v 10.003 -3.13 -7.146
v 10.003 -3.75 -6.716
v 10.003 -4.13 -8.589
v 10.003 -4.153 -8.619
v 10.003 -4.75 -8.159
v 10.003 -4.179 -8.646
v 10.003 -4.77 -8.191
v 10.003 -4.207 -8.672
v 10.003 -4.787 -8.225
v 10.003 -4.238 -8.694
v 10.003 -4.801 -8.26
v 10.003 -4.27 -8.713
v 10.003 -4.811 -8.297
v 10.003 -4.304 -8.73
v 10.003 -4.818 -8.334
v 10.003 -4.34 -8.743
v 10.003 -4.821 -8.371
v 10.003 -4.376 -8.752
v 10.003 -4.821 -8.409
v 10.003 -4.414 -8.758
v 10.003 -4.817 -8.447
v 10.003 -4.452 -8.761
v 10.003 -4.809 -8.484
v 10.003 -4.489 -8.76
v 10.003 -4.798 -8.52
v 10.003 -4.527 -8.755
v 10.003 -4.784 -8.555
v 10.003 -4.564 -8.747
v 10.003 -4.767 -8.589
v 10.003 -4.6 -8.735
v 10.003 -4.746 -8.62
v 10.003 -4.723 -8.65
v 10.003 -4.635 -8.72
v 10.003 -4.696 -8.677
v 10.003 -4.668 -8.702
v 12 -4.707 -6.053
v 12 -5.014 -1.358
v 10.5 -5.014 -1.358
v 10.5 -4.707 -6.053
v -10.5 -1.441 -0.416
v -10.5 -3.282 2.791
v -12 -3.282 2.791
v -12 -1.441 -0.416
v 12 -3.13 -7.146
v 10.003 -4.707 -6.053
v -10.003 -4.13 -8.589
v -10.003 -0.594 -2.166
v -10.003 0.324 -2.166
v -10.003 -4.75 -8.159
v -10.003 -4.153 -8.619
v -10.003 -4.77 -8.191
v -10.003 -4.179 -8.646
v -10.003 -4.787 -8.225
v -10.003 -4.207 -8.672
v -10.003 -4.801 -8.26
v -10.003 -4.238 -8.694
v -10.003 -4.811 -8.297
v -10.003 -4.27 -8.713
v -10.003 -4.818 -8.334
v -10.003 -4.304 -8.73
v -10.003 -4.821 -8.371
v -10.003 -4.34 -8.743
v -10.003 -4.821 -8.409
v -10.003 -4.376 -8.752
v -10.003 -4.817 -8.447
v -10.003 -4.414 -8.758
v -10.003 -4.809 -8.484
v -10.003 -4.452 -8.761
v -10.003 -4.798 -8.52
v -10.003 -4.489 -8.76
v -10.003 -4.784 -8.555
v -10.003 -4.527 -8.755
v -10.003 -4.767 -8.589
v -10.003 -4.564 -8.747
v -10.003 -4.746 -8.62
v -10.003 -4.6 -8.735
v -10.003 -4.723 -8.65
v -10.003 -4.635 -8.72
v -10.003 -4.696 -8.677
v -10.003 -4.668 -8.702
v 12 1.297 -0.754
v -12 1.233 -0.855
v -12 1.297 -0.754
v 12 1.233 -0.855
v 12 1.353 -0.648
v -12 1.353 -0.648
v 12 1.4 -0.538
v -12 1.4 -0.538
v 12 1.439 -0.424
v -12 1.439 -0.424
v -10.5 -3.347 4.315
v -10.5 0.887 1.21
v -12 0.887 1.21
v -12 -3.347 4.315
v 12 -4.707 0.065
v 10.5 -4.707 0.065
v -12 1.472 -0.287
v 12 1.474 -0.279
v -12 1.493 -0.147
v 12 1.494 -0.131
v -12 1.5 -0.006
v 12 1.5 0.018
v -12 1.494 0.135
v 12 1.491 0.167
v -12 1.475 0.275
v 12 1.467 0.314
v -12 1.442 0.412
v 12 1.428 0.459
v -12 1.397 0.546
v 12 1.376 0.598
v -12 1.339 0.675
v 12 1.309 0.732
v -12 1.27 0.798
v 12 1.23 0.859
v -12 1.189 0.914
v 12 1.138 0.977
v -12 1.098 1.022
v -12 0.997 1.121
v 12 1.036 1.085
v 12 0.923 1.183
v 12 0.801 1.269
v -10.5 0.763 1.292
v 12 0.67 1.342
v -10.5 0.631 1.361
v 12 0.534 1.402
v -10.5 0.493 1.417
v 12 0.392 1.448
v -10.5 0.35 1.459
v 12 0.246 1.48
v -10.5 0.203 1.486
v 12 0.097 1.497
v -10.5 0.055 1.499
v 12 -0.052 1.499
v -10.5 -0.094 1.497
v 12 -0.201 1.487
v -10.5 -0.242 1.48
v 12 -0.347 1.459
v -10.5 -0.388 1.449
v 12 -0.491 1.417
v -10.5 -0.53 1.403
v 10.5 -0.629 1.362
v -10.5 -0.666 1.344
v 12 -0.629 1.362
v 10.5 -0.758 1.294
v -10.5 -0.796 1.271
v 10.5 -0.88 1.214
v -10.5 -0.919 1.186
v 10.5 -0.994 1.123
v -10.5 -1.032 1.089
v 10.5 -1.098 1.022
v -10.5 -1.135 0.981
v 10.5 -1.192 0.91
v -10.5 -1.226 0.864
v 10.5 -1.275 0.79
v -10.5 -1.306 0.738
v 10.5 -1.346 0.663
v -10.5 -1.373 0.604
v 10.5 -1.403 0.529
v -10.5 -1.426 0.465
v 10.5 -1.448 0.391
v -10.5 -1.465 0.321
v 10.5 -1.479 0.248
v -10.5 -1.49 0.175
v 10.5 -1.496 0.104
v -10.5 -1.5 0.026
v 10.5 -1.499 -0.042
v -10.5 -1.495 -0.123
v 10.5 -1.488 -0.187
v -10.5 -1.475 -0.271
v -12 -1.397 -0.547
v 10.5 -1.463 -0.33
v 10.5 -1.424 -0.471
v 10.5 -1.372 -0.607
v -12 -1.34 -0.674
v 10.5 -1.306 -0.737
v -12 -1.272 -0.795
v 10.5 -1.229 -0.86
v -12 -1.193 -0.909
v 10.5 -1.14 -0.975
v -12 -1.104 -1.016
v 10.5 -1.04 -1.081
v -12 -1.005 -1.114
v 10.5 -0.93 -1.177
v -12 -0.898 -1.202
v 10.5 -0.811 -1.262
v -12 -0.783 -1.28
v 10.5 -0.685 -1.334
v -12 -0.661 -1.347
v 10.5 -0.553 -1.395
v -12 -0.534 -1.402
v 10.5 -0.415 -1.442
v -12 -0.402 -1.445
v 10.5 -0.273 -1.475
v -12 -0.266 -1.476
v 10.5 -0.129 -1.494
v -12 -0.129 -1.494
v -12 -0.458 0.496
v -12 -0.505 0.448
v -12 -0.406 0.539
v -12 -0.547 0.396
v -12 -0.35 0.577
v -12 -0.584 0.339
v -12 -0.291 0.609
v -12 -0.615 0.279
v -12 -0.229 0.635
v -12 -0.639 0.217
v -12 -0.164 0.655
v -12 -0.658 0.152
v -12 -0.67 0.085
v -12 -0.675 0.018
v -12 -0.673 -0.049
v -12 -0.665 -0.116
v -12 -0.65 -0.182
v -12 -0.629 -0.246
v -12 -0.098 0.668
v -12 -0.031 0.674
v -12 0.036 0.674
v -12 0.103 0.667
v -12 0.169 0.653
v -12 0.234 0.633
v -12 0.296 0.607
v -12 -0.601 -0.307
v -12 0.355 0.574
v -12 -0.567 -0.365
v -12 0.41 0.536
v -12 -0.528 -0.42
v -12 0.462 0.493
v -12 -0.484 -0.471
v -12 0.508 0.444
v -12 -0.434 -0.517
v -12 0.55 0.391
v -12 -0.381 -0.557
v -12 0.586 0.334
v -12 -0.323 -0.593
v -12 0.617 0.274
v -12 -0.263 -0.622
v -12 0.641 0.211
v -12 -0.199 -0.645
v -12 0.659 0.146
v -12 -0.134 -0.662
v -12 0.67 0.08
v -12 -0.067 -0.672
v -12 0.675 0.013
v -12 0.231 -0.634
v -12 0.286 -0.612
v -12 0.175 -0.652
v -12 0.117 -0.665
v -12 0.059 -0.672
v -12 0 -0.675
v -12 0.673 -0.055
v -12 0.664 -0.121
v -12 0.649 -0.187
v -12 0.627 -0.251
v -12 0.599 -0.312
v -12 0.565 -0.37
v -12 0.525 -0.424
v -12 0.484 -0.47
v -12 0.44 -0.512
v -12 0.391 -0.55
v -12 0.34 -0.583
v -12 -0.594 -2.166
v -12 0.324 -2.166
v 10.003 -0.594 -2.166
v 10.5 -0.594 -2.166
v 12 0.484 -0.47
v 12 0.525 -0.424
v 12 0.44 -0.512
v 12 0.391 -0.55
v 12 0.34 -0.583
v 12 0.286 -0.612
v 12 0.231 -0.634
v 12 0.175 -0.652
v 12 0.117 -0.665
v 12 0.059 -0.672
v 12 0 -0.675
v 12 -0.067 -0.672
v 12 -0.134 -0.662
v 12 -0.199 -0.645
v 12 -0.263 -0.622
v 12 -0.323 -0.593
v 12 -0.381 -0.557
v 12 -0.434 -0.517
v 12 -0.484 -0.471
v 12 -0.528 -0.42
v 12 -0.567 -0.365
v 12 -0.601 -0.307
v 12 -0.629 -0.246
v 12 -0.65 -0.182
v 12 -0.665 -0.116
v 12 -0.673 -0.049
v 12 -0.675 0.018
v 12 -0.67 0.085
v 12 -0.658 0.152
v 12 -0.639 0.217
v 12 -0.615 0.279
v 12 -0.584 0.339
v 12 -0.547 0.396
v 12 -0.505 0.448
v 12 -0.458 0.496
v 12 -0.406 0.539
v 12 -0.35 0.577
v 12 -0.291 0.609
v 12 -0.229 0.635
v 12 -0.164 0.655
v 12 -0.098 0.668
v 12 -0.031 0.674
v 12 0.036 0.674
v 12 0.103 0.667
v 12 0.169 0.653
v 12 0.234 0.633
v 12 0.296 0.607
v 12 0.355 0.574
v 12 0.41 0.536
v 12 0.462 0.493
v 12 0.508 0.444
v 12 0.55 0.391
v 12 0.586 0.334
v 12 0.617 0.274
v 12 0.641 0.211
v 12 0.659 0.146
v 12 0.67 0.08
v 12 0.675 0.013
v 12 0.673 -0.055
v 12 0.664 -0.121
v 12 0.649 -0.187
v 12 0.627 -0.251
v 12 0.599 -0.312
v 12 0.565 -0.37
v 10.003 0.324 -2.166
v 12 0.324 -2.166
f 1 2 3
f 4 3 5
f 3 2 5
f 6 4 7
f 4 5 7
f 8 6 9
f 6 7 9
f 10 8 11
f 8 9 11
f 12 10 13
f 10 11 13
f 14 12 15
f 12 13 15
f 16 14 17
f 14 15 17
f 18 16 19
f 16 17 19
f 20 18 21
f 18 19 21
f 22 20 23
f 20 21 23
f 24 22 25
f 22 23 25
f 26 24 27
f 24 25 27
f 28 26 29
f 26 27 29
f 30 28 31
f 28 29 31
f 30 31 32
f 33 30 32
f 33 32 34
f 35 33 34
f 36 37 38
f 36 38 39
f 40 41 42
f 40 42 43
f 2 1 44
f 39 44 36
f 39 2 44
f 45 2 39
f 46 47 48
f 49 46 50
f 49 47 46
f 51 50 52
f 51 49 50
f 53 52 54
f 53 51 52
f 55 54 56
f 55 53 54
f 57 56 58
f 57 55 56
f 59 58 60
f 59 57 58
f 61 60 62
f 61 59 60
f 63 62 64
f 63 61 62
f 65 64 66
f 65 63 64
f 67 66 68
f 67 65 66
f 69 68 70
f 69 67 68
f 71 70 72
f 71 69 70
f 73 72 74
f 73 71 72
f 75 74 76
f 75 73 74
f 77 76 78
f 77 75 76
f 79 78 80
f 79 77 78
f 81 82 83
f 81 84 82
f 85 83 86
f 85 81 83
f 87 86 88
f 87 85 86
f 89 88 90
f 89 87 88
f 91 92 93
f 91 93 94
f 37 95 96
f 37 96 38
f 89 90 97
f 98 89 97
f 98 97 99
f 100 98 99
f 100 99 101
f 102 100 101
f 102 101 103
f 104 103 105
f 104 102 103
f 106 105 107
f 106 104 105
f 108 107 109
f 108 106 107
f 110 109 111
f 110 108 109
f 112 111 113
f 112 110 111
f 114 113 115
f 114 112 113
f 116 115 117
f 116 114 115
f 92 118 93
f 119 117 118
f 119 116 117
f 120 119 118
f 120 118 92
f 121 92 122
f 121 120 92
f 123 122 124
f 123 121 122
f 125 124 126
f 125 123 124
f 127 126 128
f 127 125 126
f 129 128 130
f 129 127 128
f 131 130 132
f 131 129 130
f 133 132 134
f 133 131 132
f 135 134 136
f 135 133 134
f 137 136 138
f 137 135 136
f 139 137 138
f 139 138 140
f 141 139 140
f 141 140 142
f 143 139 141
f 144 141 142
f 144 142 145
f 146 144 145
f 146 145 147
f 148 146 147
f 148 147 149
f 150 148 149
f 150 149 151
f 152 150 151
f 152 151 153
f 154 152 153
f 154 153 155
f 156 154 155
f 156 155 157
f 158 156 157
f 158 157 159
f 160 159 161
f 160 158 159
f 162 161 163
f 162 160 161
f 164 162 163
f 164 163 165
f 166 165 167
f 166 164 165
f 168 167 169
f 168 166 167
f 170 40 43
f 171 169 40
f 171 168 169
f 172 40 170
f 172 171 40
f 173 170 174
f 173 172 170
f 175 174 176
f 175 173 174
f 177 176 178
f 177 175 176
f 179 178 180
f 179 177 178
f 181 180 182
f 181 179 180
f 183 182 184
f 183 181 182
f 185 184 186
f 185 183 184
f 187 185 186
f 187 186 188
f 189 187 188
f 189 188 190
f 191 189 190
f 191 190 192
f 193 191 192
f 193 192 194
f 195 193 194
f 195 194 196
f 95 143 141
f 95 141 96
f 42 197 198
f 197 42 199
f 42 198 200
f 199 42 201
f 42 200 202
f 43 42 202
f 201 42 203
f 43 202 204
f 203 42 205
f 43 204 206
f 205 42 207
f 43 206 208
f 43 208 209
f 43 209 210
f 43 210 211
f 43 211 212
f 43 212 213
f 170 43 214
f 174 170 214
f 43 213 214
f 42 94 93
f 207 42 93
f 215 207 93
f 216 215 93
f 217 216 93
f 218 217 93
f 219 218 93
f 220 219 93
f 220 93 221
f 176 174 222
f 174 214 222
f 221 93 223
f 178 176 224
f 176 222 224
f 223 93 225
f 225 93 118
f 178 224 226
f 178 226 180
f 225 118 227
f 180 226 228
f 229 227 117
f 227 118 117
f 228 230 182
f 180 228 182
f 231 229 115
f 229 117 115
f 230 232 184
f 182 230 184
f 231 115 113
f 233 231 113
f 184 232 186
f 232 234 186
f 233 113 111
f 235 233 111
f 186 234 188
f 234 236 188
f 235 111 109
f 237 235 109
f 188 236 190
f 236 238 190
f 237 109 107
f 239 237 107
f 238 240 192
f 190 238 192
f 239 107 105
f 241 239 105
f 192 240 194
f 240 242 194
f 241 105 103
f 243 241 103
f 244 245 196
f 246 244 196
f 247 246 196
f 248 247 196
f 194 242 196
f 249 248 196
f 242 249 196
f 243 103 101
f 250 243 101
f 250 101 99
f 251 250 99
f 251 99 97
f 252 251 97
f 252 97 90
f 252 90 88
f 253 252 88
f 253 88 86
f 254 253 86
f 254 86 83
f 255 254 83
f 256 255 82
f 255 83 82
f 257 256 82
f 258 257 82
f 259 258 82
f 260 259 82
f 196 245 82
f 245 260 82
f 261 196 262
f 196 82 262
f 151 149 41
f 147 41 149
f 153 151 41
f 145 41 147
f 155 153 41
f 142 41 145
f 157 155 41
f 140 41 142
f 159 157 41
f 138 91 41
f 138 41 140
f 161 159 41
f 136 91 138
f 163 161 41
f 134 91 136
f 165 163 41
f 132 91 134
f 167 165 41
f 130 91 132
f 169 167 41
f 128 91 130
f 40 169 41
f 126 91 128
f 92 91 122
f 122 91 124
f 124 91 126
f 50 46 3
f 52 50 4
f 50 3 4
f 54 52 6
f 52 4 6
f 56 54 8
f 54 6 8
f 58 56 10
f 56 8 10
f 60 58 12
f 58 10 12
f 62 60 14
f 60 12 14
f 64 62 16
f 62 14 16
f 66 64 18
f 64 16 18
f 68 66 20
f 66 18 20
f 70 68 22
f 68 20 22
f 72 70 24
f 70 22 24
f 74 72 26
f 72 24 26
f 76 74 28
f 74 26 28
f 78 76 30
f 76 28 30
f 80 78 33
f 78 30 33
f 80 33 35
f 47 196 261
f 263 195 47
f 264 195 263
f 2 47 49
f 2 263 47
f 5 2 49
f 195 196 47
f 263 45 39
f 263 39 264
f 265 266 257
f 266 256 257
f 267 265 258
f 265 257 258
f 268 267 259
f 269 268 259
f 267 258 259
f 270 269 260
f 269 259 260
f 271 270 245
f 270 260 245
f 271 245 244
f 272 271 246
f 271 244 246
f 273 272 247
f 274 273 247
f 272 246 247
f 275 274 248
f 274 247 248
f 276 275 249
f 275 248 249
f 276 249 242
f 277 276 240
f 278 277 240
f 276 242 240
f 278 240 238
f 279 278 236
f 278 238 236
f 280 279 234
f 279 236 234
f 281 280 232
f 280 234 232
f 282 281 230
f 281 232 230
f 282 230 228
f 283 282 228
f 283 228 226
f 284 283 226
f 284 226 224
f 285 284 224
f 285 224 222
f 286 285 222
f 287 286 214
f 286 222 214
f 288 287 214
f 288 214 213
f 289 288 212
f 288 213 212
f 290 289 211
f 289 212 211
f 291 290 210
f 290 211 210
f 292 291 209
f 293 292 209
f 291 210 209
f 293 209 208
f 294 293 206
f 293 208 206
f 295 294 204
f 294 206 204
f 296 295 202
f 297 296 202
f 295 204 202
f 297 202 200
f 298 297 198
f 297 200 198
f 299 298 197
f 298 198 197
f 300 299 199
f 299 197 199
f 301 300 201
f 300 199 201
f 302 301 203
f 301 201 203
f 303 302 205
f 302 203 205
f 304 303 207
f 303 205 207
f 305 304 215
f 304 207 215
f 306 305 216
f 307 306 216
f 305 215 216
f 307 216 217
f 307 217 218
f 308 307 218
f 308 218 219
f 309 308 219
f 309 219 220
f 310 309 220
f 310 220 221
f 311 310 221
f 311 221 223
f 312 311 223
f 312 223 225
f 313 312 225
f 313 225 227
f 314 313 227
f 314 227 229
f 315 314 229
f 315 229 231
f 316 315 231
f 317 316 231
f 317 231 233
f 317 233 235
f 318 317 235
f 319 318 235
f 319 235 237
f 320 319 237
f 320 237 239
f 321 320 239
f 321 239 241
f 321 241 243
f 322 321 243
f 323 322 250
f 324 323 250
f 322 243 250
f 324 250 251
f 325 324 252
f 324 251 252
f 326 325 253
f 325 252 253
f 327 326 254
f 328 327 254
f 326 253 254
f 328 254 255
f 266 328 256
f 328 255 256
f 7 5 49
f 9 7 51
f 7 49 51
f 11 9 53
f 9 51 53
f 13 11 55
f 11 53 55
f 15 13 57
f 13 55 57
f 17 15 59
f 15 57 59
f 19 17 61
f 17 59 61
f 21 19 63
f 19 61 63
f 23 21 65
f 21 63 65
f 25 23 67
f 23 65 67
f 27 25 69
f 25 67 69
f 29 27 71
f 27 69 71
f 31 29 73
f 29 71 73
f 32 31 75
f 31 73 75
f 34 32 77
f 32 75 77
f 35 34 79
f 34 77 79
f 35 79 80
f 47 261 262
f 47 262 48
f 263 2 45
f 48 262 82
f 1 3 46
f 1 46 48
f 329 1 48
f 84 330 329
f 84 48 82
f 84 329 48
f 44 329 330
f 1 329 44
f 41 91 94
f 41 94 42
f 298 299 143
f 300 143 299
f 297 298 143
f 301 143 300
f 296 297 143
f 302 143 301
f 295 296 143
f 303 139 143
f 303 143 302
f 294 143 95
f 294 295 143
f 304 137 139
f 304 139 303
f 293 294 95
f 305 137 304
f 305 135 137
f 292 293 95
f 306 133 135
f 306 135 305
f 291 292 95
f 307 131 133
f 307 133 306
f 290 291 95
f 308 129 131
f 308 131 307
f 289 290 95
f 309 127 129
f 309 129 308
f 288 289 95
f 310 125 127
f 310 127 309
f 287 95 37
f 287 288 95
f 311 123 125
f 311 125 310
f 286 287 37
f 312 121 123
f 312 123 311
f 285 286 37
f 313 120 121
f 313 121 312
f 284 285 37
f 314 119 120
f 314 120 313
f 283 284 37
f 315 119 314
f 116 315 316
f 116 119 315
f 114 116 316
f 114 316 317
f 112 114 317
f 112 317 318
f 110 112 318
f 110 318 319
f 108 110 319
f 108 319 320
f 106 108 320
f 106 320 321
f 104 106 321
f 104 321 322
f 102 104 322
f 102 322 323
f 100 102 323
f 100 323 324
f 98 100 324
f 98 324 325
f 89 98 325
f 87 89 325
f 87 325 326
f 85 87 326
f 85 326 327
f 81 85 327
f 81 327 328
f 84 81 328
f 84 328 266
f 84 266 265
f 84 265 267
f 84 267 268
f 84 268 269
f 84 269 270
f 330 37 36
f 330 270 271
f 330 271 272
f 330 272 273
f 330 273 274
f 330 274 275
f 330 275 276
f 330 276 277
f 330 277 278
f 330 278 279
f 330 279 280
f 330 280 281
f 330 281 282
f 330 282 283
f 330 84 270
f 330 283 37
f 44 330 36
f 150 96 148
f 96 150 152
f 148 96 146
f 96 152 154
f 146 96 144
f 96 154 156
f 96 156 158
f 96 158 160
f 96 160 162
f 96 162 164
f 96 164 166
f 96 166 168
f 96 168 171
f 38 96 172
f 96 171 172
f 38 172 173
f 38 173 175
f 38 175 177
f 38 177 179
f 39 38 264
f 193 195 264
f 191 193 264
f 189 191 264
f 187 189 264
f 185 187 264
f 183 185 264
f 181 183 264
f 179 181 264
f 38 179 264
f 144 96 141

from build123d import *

# Parameters (mm, degrees)
EXTRUDE_1_DEPTH          = 12
CUT_EXTRUDE_1_DEPTH      = 10
CUT_EXTRUDE_1_DEPTH_BACK = 10
SKETCH_2_W               = 2.506204129
SKETCH_2_H               = 10.984391515
EXTRUDE_START            = -1.5
EXTRUDE_2_DEPTH          = 1.5
FILLET_1_R               = 0.4
EXTRUDE_3_DEPTH          = 1.5
EXTRUDE_4_REACH          = 26.208


with BuildPart() as part:
    # 草图1 → 凸台-拉伸1 (new, symmetric)
    with BuildSketch(Plane(origin=(0, 0, 0), x_dir=(0, 0, -1), z_dir=(1, 0, 0))):
        with BuildLine():
            ThreePointArc((0.424459717, 1.438691749), (-1.23881175, -0.84578097), (1.494480371, -0.128562902))
            Line((1.494480371, -0.128562902), (0.897098533, 0.285679978))
            Line((0.897098533, 0.285679978), (0.611565164, 0.285679978))
            ThreePointArc((0.611565164, 0.285679978), (0.658950486, 0.146319025), (0.675, 0))
            ThreePointArc((0.675, 0), (-0.609153227, -0.290787458), (0.424459717, 0.524841832))
            Line((0.424459717, 0.524841832), (0.424459717, 1.438691749))
        make_face()
        with BuildLine():
            Line((8.48773274, -4.977898486), (8.91741162, -4.358256311))
            Line((8.91741162, -4.358256311), (0.854750449, 1.232640122))
            ThreePointArc((0.854750449, 1.232640122), (1.328932969, 0.695655923), (1.5, 0))
            ThreePointArc((1.5, 0), (1.498619458, -0.064340668), (1.494480371, -0.128562902))
            Line((1.494480371, -0.128562902), (8.48773274, -4.977898486))
        make_face()
        with BuildLine():
            ThreePointArc((1.5, 0), (1.328932969, 0.695655923), (0.854750449, 1.232640122))
            ThreePointArc((0.854750449, 1.232640122), (0.647849504, 1.352882485), (0.424459717, 1.438691749))
            Line((0.424459717, 1.438691749), (0.424459717, 0.524841832))
            ThreePointArc((0.424459717, 0.524841832), (0.531635671, 0.415918878), (0.611565164, 0.285679978))
            Line((0.611565164, 0.285679978), (0.897098533, 0.285679978))
            Line((0.897098533, 0.285679978), (1.494480371, -0.128562902))
            ThreePointArc((1.494480371, -0.128562902), (1.498619458, -0.064340668), (1.5, 0))
        make_face()
    extrude(amount=EXTRUDE_1_DEPTH, both=True)

    # 草图2 → 切除-拉伸1 (cut, two sides: drawn at the far end of the back side and taken through both)
    with BuildSketch(Plane(origin=(0, 0, 0), x_dir=(1, 0, 0), z_dir=(0, 1, 0)).offset(-CUT_EXTRUDE_1_DEPTH_BACK)):
        with Locations((-11.255680748, 7.657884592)):
            Rectangle(SKETCH_2_W, SKETCH_2_H)
        with Locations((11.255680748, 7.657884592)):
            Rectangle(SKETCH_2_W, SKETCH_2_H)
    extrude(amount=CUT_EXTRUDE_1_DEPTH + CUT_EXTRUDE_1_DEPTH_BACK, mode=Mode.SUBTRACT)

    # 草图3 → 凸台-拉伸2 (add)
    with BuildSketch(Plane.ZY.offset(12).offset(EXTRUDE_START)):
        with BuildLine():
            Line((1.209536672, 0.887142063), (4.315061937, -3.346956229))
            Line((4.315061937, -3.346956229), (2.791074167, -3.281580786))
            Line((2.791074167, -3.281580786), (-0.41583993, -1.441206839))
            ThreePointArc((-0.41583993, -1.441206839), (1.229955601, -0.858608886), (1.209536672, 0.887142063))
        make_face()
    extrude(amount=EXTRUDE_2_DEPTH)

    # 圆角1
    # the kernel refuses this fillet: 0.4 mm, written as the material it takes off along each edge
    with BuildSketch(Plane(origin=(0, -4.977898486, -8.48773274), x_dir=(0, 0.5698336328652603, 0.8217600810793743), z_dir=(-1, 0, 0)), Plane(origin=(0, -4.358256311, -8.91741162), x_dir=(0, 0.5698336328652598, 0.8217600810793746), z_dir=(1, 0, 0))) as fillet_1_piece_1:
        with BuildLine():
            CenterArc((FILLET_1_R, FILLET_1_R), FILLET_1_R, 180, 90)
            Line((0, FILLET_1_R), (0, 0))
            Line((0, 0), (FILLET_1_R, 0))
        make_face()
    extrude(amount=11.002578683, mode=Mode.SUBTRACT)
    with BuildSketch(Plane(origin=(0, -4.358256311, -8.91741162), x_dir=(0, 0.5698336328652598, 0.8217600810793746), z_dir=(-1, 0, 0)), Plane(origin=(0, -4.977898486, -8.48773274), x_dir=(0, 0.5698336328652603, 0.8217600810793743), z_dir=(1, 0, 0))) as fillet_1_piece_2:
        with BuildLine():
            CenterArc((FILLET_1_R, -FILLET_1_R), FILLET_1_R, 90, 90)
            Line((0, -FILLET_1_R), (0, 0))
            Line((0, 0), (FILLET_1_R, 0))
        make_face()
    extrude(amount=11.002578683, mode=Mode.SUBTRACT)

    # 草图4 → 凸台-拉伸3 (add)
    with BuildSketch(Plane(origin=(12, 0, 0), x_dir=(0, 0, -1), z_dir=(1, 0, 0))):
        with BuildLine():
            Line((-1.361590085, -0.629342864), (-0.064760058, -4.70678049))
            Line((-0.064760058, -4.70678049), (1.358347945, -5.014160577))
            Line((1.358347945, -5.014160577), (6.052641572, -4.70678049))
            Line((6.052641572, -4.70678049), (2.165688834, -0.593999427))
            Line((2.165688834, -0.593999427), (1.494480371, -0.128562902))
            ThreePointArc((1.494480371, -0.128562902), (0.259056171, -1.477460626), (-1.361590085, -0.629342864))
        make_face()
    extrude(amount=-EXTRUDE_3_DEPTH)

    # 凸台-拉伸4: up to this face of the body (flat: up to its plane)
    extrude_4_end = Plane(part.part.faces().sort_by_distance((12, -3.083366952, -2.010931635))[0])
    # 草图5 → 凸台-拉伸4 (add, up to the picked face)
    with BuildSketch(Plane(origin=(10.002578683, 0, 0), x_dir=(0, 0, -1), z_dir=(1, 0, 0)), mode=Mode.PRIVATE) as extrude_4_sk1:
        Polygon((6.052641572, -4.70678049), (2.165688834, -0.593999427), (2.165688834, 0.323595257), (7.146064321, -3.129949789), align=None)
    extrude_4_tool1 = split(extrude(extrude_4_sk1.sketch, amount=EXTRUDE_4_REACH, mode=Mode.PRIVATE), bisect_by=extrude_4_end, keep=Keep.BOTH, mode=Mode.PRIVATE)
    add(extrude_4_tool1.solids().sort_by(Axis((10.002579, -2.305975, -4.731819), (1, 0, 0)))[0])


solid = part.part
